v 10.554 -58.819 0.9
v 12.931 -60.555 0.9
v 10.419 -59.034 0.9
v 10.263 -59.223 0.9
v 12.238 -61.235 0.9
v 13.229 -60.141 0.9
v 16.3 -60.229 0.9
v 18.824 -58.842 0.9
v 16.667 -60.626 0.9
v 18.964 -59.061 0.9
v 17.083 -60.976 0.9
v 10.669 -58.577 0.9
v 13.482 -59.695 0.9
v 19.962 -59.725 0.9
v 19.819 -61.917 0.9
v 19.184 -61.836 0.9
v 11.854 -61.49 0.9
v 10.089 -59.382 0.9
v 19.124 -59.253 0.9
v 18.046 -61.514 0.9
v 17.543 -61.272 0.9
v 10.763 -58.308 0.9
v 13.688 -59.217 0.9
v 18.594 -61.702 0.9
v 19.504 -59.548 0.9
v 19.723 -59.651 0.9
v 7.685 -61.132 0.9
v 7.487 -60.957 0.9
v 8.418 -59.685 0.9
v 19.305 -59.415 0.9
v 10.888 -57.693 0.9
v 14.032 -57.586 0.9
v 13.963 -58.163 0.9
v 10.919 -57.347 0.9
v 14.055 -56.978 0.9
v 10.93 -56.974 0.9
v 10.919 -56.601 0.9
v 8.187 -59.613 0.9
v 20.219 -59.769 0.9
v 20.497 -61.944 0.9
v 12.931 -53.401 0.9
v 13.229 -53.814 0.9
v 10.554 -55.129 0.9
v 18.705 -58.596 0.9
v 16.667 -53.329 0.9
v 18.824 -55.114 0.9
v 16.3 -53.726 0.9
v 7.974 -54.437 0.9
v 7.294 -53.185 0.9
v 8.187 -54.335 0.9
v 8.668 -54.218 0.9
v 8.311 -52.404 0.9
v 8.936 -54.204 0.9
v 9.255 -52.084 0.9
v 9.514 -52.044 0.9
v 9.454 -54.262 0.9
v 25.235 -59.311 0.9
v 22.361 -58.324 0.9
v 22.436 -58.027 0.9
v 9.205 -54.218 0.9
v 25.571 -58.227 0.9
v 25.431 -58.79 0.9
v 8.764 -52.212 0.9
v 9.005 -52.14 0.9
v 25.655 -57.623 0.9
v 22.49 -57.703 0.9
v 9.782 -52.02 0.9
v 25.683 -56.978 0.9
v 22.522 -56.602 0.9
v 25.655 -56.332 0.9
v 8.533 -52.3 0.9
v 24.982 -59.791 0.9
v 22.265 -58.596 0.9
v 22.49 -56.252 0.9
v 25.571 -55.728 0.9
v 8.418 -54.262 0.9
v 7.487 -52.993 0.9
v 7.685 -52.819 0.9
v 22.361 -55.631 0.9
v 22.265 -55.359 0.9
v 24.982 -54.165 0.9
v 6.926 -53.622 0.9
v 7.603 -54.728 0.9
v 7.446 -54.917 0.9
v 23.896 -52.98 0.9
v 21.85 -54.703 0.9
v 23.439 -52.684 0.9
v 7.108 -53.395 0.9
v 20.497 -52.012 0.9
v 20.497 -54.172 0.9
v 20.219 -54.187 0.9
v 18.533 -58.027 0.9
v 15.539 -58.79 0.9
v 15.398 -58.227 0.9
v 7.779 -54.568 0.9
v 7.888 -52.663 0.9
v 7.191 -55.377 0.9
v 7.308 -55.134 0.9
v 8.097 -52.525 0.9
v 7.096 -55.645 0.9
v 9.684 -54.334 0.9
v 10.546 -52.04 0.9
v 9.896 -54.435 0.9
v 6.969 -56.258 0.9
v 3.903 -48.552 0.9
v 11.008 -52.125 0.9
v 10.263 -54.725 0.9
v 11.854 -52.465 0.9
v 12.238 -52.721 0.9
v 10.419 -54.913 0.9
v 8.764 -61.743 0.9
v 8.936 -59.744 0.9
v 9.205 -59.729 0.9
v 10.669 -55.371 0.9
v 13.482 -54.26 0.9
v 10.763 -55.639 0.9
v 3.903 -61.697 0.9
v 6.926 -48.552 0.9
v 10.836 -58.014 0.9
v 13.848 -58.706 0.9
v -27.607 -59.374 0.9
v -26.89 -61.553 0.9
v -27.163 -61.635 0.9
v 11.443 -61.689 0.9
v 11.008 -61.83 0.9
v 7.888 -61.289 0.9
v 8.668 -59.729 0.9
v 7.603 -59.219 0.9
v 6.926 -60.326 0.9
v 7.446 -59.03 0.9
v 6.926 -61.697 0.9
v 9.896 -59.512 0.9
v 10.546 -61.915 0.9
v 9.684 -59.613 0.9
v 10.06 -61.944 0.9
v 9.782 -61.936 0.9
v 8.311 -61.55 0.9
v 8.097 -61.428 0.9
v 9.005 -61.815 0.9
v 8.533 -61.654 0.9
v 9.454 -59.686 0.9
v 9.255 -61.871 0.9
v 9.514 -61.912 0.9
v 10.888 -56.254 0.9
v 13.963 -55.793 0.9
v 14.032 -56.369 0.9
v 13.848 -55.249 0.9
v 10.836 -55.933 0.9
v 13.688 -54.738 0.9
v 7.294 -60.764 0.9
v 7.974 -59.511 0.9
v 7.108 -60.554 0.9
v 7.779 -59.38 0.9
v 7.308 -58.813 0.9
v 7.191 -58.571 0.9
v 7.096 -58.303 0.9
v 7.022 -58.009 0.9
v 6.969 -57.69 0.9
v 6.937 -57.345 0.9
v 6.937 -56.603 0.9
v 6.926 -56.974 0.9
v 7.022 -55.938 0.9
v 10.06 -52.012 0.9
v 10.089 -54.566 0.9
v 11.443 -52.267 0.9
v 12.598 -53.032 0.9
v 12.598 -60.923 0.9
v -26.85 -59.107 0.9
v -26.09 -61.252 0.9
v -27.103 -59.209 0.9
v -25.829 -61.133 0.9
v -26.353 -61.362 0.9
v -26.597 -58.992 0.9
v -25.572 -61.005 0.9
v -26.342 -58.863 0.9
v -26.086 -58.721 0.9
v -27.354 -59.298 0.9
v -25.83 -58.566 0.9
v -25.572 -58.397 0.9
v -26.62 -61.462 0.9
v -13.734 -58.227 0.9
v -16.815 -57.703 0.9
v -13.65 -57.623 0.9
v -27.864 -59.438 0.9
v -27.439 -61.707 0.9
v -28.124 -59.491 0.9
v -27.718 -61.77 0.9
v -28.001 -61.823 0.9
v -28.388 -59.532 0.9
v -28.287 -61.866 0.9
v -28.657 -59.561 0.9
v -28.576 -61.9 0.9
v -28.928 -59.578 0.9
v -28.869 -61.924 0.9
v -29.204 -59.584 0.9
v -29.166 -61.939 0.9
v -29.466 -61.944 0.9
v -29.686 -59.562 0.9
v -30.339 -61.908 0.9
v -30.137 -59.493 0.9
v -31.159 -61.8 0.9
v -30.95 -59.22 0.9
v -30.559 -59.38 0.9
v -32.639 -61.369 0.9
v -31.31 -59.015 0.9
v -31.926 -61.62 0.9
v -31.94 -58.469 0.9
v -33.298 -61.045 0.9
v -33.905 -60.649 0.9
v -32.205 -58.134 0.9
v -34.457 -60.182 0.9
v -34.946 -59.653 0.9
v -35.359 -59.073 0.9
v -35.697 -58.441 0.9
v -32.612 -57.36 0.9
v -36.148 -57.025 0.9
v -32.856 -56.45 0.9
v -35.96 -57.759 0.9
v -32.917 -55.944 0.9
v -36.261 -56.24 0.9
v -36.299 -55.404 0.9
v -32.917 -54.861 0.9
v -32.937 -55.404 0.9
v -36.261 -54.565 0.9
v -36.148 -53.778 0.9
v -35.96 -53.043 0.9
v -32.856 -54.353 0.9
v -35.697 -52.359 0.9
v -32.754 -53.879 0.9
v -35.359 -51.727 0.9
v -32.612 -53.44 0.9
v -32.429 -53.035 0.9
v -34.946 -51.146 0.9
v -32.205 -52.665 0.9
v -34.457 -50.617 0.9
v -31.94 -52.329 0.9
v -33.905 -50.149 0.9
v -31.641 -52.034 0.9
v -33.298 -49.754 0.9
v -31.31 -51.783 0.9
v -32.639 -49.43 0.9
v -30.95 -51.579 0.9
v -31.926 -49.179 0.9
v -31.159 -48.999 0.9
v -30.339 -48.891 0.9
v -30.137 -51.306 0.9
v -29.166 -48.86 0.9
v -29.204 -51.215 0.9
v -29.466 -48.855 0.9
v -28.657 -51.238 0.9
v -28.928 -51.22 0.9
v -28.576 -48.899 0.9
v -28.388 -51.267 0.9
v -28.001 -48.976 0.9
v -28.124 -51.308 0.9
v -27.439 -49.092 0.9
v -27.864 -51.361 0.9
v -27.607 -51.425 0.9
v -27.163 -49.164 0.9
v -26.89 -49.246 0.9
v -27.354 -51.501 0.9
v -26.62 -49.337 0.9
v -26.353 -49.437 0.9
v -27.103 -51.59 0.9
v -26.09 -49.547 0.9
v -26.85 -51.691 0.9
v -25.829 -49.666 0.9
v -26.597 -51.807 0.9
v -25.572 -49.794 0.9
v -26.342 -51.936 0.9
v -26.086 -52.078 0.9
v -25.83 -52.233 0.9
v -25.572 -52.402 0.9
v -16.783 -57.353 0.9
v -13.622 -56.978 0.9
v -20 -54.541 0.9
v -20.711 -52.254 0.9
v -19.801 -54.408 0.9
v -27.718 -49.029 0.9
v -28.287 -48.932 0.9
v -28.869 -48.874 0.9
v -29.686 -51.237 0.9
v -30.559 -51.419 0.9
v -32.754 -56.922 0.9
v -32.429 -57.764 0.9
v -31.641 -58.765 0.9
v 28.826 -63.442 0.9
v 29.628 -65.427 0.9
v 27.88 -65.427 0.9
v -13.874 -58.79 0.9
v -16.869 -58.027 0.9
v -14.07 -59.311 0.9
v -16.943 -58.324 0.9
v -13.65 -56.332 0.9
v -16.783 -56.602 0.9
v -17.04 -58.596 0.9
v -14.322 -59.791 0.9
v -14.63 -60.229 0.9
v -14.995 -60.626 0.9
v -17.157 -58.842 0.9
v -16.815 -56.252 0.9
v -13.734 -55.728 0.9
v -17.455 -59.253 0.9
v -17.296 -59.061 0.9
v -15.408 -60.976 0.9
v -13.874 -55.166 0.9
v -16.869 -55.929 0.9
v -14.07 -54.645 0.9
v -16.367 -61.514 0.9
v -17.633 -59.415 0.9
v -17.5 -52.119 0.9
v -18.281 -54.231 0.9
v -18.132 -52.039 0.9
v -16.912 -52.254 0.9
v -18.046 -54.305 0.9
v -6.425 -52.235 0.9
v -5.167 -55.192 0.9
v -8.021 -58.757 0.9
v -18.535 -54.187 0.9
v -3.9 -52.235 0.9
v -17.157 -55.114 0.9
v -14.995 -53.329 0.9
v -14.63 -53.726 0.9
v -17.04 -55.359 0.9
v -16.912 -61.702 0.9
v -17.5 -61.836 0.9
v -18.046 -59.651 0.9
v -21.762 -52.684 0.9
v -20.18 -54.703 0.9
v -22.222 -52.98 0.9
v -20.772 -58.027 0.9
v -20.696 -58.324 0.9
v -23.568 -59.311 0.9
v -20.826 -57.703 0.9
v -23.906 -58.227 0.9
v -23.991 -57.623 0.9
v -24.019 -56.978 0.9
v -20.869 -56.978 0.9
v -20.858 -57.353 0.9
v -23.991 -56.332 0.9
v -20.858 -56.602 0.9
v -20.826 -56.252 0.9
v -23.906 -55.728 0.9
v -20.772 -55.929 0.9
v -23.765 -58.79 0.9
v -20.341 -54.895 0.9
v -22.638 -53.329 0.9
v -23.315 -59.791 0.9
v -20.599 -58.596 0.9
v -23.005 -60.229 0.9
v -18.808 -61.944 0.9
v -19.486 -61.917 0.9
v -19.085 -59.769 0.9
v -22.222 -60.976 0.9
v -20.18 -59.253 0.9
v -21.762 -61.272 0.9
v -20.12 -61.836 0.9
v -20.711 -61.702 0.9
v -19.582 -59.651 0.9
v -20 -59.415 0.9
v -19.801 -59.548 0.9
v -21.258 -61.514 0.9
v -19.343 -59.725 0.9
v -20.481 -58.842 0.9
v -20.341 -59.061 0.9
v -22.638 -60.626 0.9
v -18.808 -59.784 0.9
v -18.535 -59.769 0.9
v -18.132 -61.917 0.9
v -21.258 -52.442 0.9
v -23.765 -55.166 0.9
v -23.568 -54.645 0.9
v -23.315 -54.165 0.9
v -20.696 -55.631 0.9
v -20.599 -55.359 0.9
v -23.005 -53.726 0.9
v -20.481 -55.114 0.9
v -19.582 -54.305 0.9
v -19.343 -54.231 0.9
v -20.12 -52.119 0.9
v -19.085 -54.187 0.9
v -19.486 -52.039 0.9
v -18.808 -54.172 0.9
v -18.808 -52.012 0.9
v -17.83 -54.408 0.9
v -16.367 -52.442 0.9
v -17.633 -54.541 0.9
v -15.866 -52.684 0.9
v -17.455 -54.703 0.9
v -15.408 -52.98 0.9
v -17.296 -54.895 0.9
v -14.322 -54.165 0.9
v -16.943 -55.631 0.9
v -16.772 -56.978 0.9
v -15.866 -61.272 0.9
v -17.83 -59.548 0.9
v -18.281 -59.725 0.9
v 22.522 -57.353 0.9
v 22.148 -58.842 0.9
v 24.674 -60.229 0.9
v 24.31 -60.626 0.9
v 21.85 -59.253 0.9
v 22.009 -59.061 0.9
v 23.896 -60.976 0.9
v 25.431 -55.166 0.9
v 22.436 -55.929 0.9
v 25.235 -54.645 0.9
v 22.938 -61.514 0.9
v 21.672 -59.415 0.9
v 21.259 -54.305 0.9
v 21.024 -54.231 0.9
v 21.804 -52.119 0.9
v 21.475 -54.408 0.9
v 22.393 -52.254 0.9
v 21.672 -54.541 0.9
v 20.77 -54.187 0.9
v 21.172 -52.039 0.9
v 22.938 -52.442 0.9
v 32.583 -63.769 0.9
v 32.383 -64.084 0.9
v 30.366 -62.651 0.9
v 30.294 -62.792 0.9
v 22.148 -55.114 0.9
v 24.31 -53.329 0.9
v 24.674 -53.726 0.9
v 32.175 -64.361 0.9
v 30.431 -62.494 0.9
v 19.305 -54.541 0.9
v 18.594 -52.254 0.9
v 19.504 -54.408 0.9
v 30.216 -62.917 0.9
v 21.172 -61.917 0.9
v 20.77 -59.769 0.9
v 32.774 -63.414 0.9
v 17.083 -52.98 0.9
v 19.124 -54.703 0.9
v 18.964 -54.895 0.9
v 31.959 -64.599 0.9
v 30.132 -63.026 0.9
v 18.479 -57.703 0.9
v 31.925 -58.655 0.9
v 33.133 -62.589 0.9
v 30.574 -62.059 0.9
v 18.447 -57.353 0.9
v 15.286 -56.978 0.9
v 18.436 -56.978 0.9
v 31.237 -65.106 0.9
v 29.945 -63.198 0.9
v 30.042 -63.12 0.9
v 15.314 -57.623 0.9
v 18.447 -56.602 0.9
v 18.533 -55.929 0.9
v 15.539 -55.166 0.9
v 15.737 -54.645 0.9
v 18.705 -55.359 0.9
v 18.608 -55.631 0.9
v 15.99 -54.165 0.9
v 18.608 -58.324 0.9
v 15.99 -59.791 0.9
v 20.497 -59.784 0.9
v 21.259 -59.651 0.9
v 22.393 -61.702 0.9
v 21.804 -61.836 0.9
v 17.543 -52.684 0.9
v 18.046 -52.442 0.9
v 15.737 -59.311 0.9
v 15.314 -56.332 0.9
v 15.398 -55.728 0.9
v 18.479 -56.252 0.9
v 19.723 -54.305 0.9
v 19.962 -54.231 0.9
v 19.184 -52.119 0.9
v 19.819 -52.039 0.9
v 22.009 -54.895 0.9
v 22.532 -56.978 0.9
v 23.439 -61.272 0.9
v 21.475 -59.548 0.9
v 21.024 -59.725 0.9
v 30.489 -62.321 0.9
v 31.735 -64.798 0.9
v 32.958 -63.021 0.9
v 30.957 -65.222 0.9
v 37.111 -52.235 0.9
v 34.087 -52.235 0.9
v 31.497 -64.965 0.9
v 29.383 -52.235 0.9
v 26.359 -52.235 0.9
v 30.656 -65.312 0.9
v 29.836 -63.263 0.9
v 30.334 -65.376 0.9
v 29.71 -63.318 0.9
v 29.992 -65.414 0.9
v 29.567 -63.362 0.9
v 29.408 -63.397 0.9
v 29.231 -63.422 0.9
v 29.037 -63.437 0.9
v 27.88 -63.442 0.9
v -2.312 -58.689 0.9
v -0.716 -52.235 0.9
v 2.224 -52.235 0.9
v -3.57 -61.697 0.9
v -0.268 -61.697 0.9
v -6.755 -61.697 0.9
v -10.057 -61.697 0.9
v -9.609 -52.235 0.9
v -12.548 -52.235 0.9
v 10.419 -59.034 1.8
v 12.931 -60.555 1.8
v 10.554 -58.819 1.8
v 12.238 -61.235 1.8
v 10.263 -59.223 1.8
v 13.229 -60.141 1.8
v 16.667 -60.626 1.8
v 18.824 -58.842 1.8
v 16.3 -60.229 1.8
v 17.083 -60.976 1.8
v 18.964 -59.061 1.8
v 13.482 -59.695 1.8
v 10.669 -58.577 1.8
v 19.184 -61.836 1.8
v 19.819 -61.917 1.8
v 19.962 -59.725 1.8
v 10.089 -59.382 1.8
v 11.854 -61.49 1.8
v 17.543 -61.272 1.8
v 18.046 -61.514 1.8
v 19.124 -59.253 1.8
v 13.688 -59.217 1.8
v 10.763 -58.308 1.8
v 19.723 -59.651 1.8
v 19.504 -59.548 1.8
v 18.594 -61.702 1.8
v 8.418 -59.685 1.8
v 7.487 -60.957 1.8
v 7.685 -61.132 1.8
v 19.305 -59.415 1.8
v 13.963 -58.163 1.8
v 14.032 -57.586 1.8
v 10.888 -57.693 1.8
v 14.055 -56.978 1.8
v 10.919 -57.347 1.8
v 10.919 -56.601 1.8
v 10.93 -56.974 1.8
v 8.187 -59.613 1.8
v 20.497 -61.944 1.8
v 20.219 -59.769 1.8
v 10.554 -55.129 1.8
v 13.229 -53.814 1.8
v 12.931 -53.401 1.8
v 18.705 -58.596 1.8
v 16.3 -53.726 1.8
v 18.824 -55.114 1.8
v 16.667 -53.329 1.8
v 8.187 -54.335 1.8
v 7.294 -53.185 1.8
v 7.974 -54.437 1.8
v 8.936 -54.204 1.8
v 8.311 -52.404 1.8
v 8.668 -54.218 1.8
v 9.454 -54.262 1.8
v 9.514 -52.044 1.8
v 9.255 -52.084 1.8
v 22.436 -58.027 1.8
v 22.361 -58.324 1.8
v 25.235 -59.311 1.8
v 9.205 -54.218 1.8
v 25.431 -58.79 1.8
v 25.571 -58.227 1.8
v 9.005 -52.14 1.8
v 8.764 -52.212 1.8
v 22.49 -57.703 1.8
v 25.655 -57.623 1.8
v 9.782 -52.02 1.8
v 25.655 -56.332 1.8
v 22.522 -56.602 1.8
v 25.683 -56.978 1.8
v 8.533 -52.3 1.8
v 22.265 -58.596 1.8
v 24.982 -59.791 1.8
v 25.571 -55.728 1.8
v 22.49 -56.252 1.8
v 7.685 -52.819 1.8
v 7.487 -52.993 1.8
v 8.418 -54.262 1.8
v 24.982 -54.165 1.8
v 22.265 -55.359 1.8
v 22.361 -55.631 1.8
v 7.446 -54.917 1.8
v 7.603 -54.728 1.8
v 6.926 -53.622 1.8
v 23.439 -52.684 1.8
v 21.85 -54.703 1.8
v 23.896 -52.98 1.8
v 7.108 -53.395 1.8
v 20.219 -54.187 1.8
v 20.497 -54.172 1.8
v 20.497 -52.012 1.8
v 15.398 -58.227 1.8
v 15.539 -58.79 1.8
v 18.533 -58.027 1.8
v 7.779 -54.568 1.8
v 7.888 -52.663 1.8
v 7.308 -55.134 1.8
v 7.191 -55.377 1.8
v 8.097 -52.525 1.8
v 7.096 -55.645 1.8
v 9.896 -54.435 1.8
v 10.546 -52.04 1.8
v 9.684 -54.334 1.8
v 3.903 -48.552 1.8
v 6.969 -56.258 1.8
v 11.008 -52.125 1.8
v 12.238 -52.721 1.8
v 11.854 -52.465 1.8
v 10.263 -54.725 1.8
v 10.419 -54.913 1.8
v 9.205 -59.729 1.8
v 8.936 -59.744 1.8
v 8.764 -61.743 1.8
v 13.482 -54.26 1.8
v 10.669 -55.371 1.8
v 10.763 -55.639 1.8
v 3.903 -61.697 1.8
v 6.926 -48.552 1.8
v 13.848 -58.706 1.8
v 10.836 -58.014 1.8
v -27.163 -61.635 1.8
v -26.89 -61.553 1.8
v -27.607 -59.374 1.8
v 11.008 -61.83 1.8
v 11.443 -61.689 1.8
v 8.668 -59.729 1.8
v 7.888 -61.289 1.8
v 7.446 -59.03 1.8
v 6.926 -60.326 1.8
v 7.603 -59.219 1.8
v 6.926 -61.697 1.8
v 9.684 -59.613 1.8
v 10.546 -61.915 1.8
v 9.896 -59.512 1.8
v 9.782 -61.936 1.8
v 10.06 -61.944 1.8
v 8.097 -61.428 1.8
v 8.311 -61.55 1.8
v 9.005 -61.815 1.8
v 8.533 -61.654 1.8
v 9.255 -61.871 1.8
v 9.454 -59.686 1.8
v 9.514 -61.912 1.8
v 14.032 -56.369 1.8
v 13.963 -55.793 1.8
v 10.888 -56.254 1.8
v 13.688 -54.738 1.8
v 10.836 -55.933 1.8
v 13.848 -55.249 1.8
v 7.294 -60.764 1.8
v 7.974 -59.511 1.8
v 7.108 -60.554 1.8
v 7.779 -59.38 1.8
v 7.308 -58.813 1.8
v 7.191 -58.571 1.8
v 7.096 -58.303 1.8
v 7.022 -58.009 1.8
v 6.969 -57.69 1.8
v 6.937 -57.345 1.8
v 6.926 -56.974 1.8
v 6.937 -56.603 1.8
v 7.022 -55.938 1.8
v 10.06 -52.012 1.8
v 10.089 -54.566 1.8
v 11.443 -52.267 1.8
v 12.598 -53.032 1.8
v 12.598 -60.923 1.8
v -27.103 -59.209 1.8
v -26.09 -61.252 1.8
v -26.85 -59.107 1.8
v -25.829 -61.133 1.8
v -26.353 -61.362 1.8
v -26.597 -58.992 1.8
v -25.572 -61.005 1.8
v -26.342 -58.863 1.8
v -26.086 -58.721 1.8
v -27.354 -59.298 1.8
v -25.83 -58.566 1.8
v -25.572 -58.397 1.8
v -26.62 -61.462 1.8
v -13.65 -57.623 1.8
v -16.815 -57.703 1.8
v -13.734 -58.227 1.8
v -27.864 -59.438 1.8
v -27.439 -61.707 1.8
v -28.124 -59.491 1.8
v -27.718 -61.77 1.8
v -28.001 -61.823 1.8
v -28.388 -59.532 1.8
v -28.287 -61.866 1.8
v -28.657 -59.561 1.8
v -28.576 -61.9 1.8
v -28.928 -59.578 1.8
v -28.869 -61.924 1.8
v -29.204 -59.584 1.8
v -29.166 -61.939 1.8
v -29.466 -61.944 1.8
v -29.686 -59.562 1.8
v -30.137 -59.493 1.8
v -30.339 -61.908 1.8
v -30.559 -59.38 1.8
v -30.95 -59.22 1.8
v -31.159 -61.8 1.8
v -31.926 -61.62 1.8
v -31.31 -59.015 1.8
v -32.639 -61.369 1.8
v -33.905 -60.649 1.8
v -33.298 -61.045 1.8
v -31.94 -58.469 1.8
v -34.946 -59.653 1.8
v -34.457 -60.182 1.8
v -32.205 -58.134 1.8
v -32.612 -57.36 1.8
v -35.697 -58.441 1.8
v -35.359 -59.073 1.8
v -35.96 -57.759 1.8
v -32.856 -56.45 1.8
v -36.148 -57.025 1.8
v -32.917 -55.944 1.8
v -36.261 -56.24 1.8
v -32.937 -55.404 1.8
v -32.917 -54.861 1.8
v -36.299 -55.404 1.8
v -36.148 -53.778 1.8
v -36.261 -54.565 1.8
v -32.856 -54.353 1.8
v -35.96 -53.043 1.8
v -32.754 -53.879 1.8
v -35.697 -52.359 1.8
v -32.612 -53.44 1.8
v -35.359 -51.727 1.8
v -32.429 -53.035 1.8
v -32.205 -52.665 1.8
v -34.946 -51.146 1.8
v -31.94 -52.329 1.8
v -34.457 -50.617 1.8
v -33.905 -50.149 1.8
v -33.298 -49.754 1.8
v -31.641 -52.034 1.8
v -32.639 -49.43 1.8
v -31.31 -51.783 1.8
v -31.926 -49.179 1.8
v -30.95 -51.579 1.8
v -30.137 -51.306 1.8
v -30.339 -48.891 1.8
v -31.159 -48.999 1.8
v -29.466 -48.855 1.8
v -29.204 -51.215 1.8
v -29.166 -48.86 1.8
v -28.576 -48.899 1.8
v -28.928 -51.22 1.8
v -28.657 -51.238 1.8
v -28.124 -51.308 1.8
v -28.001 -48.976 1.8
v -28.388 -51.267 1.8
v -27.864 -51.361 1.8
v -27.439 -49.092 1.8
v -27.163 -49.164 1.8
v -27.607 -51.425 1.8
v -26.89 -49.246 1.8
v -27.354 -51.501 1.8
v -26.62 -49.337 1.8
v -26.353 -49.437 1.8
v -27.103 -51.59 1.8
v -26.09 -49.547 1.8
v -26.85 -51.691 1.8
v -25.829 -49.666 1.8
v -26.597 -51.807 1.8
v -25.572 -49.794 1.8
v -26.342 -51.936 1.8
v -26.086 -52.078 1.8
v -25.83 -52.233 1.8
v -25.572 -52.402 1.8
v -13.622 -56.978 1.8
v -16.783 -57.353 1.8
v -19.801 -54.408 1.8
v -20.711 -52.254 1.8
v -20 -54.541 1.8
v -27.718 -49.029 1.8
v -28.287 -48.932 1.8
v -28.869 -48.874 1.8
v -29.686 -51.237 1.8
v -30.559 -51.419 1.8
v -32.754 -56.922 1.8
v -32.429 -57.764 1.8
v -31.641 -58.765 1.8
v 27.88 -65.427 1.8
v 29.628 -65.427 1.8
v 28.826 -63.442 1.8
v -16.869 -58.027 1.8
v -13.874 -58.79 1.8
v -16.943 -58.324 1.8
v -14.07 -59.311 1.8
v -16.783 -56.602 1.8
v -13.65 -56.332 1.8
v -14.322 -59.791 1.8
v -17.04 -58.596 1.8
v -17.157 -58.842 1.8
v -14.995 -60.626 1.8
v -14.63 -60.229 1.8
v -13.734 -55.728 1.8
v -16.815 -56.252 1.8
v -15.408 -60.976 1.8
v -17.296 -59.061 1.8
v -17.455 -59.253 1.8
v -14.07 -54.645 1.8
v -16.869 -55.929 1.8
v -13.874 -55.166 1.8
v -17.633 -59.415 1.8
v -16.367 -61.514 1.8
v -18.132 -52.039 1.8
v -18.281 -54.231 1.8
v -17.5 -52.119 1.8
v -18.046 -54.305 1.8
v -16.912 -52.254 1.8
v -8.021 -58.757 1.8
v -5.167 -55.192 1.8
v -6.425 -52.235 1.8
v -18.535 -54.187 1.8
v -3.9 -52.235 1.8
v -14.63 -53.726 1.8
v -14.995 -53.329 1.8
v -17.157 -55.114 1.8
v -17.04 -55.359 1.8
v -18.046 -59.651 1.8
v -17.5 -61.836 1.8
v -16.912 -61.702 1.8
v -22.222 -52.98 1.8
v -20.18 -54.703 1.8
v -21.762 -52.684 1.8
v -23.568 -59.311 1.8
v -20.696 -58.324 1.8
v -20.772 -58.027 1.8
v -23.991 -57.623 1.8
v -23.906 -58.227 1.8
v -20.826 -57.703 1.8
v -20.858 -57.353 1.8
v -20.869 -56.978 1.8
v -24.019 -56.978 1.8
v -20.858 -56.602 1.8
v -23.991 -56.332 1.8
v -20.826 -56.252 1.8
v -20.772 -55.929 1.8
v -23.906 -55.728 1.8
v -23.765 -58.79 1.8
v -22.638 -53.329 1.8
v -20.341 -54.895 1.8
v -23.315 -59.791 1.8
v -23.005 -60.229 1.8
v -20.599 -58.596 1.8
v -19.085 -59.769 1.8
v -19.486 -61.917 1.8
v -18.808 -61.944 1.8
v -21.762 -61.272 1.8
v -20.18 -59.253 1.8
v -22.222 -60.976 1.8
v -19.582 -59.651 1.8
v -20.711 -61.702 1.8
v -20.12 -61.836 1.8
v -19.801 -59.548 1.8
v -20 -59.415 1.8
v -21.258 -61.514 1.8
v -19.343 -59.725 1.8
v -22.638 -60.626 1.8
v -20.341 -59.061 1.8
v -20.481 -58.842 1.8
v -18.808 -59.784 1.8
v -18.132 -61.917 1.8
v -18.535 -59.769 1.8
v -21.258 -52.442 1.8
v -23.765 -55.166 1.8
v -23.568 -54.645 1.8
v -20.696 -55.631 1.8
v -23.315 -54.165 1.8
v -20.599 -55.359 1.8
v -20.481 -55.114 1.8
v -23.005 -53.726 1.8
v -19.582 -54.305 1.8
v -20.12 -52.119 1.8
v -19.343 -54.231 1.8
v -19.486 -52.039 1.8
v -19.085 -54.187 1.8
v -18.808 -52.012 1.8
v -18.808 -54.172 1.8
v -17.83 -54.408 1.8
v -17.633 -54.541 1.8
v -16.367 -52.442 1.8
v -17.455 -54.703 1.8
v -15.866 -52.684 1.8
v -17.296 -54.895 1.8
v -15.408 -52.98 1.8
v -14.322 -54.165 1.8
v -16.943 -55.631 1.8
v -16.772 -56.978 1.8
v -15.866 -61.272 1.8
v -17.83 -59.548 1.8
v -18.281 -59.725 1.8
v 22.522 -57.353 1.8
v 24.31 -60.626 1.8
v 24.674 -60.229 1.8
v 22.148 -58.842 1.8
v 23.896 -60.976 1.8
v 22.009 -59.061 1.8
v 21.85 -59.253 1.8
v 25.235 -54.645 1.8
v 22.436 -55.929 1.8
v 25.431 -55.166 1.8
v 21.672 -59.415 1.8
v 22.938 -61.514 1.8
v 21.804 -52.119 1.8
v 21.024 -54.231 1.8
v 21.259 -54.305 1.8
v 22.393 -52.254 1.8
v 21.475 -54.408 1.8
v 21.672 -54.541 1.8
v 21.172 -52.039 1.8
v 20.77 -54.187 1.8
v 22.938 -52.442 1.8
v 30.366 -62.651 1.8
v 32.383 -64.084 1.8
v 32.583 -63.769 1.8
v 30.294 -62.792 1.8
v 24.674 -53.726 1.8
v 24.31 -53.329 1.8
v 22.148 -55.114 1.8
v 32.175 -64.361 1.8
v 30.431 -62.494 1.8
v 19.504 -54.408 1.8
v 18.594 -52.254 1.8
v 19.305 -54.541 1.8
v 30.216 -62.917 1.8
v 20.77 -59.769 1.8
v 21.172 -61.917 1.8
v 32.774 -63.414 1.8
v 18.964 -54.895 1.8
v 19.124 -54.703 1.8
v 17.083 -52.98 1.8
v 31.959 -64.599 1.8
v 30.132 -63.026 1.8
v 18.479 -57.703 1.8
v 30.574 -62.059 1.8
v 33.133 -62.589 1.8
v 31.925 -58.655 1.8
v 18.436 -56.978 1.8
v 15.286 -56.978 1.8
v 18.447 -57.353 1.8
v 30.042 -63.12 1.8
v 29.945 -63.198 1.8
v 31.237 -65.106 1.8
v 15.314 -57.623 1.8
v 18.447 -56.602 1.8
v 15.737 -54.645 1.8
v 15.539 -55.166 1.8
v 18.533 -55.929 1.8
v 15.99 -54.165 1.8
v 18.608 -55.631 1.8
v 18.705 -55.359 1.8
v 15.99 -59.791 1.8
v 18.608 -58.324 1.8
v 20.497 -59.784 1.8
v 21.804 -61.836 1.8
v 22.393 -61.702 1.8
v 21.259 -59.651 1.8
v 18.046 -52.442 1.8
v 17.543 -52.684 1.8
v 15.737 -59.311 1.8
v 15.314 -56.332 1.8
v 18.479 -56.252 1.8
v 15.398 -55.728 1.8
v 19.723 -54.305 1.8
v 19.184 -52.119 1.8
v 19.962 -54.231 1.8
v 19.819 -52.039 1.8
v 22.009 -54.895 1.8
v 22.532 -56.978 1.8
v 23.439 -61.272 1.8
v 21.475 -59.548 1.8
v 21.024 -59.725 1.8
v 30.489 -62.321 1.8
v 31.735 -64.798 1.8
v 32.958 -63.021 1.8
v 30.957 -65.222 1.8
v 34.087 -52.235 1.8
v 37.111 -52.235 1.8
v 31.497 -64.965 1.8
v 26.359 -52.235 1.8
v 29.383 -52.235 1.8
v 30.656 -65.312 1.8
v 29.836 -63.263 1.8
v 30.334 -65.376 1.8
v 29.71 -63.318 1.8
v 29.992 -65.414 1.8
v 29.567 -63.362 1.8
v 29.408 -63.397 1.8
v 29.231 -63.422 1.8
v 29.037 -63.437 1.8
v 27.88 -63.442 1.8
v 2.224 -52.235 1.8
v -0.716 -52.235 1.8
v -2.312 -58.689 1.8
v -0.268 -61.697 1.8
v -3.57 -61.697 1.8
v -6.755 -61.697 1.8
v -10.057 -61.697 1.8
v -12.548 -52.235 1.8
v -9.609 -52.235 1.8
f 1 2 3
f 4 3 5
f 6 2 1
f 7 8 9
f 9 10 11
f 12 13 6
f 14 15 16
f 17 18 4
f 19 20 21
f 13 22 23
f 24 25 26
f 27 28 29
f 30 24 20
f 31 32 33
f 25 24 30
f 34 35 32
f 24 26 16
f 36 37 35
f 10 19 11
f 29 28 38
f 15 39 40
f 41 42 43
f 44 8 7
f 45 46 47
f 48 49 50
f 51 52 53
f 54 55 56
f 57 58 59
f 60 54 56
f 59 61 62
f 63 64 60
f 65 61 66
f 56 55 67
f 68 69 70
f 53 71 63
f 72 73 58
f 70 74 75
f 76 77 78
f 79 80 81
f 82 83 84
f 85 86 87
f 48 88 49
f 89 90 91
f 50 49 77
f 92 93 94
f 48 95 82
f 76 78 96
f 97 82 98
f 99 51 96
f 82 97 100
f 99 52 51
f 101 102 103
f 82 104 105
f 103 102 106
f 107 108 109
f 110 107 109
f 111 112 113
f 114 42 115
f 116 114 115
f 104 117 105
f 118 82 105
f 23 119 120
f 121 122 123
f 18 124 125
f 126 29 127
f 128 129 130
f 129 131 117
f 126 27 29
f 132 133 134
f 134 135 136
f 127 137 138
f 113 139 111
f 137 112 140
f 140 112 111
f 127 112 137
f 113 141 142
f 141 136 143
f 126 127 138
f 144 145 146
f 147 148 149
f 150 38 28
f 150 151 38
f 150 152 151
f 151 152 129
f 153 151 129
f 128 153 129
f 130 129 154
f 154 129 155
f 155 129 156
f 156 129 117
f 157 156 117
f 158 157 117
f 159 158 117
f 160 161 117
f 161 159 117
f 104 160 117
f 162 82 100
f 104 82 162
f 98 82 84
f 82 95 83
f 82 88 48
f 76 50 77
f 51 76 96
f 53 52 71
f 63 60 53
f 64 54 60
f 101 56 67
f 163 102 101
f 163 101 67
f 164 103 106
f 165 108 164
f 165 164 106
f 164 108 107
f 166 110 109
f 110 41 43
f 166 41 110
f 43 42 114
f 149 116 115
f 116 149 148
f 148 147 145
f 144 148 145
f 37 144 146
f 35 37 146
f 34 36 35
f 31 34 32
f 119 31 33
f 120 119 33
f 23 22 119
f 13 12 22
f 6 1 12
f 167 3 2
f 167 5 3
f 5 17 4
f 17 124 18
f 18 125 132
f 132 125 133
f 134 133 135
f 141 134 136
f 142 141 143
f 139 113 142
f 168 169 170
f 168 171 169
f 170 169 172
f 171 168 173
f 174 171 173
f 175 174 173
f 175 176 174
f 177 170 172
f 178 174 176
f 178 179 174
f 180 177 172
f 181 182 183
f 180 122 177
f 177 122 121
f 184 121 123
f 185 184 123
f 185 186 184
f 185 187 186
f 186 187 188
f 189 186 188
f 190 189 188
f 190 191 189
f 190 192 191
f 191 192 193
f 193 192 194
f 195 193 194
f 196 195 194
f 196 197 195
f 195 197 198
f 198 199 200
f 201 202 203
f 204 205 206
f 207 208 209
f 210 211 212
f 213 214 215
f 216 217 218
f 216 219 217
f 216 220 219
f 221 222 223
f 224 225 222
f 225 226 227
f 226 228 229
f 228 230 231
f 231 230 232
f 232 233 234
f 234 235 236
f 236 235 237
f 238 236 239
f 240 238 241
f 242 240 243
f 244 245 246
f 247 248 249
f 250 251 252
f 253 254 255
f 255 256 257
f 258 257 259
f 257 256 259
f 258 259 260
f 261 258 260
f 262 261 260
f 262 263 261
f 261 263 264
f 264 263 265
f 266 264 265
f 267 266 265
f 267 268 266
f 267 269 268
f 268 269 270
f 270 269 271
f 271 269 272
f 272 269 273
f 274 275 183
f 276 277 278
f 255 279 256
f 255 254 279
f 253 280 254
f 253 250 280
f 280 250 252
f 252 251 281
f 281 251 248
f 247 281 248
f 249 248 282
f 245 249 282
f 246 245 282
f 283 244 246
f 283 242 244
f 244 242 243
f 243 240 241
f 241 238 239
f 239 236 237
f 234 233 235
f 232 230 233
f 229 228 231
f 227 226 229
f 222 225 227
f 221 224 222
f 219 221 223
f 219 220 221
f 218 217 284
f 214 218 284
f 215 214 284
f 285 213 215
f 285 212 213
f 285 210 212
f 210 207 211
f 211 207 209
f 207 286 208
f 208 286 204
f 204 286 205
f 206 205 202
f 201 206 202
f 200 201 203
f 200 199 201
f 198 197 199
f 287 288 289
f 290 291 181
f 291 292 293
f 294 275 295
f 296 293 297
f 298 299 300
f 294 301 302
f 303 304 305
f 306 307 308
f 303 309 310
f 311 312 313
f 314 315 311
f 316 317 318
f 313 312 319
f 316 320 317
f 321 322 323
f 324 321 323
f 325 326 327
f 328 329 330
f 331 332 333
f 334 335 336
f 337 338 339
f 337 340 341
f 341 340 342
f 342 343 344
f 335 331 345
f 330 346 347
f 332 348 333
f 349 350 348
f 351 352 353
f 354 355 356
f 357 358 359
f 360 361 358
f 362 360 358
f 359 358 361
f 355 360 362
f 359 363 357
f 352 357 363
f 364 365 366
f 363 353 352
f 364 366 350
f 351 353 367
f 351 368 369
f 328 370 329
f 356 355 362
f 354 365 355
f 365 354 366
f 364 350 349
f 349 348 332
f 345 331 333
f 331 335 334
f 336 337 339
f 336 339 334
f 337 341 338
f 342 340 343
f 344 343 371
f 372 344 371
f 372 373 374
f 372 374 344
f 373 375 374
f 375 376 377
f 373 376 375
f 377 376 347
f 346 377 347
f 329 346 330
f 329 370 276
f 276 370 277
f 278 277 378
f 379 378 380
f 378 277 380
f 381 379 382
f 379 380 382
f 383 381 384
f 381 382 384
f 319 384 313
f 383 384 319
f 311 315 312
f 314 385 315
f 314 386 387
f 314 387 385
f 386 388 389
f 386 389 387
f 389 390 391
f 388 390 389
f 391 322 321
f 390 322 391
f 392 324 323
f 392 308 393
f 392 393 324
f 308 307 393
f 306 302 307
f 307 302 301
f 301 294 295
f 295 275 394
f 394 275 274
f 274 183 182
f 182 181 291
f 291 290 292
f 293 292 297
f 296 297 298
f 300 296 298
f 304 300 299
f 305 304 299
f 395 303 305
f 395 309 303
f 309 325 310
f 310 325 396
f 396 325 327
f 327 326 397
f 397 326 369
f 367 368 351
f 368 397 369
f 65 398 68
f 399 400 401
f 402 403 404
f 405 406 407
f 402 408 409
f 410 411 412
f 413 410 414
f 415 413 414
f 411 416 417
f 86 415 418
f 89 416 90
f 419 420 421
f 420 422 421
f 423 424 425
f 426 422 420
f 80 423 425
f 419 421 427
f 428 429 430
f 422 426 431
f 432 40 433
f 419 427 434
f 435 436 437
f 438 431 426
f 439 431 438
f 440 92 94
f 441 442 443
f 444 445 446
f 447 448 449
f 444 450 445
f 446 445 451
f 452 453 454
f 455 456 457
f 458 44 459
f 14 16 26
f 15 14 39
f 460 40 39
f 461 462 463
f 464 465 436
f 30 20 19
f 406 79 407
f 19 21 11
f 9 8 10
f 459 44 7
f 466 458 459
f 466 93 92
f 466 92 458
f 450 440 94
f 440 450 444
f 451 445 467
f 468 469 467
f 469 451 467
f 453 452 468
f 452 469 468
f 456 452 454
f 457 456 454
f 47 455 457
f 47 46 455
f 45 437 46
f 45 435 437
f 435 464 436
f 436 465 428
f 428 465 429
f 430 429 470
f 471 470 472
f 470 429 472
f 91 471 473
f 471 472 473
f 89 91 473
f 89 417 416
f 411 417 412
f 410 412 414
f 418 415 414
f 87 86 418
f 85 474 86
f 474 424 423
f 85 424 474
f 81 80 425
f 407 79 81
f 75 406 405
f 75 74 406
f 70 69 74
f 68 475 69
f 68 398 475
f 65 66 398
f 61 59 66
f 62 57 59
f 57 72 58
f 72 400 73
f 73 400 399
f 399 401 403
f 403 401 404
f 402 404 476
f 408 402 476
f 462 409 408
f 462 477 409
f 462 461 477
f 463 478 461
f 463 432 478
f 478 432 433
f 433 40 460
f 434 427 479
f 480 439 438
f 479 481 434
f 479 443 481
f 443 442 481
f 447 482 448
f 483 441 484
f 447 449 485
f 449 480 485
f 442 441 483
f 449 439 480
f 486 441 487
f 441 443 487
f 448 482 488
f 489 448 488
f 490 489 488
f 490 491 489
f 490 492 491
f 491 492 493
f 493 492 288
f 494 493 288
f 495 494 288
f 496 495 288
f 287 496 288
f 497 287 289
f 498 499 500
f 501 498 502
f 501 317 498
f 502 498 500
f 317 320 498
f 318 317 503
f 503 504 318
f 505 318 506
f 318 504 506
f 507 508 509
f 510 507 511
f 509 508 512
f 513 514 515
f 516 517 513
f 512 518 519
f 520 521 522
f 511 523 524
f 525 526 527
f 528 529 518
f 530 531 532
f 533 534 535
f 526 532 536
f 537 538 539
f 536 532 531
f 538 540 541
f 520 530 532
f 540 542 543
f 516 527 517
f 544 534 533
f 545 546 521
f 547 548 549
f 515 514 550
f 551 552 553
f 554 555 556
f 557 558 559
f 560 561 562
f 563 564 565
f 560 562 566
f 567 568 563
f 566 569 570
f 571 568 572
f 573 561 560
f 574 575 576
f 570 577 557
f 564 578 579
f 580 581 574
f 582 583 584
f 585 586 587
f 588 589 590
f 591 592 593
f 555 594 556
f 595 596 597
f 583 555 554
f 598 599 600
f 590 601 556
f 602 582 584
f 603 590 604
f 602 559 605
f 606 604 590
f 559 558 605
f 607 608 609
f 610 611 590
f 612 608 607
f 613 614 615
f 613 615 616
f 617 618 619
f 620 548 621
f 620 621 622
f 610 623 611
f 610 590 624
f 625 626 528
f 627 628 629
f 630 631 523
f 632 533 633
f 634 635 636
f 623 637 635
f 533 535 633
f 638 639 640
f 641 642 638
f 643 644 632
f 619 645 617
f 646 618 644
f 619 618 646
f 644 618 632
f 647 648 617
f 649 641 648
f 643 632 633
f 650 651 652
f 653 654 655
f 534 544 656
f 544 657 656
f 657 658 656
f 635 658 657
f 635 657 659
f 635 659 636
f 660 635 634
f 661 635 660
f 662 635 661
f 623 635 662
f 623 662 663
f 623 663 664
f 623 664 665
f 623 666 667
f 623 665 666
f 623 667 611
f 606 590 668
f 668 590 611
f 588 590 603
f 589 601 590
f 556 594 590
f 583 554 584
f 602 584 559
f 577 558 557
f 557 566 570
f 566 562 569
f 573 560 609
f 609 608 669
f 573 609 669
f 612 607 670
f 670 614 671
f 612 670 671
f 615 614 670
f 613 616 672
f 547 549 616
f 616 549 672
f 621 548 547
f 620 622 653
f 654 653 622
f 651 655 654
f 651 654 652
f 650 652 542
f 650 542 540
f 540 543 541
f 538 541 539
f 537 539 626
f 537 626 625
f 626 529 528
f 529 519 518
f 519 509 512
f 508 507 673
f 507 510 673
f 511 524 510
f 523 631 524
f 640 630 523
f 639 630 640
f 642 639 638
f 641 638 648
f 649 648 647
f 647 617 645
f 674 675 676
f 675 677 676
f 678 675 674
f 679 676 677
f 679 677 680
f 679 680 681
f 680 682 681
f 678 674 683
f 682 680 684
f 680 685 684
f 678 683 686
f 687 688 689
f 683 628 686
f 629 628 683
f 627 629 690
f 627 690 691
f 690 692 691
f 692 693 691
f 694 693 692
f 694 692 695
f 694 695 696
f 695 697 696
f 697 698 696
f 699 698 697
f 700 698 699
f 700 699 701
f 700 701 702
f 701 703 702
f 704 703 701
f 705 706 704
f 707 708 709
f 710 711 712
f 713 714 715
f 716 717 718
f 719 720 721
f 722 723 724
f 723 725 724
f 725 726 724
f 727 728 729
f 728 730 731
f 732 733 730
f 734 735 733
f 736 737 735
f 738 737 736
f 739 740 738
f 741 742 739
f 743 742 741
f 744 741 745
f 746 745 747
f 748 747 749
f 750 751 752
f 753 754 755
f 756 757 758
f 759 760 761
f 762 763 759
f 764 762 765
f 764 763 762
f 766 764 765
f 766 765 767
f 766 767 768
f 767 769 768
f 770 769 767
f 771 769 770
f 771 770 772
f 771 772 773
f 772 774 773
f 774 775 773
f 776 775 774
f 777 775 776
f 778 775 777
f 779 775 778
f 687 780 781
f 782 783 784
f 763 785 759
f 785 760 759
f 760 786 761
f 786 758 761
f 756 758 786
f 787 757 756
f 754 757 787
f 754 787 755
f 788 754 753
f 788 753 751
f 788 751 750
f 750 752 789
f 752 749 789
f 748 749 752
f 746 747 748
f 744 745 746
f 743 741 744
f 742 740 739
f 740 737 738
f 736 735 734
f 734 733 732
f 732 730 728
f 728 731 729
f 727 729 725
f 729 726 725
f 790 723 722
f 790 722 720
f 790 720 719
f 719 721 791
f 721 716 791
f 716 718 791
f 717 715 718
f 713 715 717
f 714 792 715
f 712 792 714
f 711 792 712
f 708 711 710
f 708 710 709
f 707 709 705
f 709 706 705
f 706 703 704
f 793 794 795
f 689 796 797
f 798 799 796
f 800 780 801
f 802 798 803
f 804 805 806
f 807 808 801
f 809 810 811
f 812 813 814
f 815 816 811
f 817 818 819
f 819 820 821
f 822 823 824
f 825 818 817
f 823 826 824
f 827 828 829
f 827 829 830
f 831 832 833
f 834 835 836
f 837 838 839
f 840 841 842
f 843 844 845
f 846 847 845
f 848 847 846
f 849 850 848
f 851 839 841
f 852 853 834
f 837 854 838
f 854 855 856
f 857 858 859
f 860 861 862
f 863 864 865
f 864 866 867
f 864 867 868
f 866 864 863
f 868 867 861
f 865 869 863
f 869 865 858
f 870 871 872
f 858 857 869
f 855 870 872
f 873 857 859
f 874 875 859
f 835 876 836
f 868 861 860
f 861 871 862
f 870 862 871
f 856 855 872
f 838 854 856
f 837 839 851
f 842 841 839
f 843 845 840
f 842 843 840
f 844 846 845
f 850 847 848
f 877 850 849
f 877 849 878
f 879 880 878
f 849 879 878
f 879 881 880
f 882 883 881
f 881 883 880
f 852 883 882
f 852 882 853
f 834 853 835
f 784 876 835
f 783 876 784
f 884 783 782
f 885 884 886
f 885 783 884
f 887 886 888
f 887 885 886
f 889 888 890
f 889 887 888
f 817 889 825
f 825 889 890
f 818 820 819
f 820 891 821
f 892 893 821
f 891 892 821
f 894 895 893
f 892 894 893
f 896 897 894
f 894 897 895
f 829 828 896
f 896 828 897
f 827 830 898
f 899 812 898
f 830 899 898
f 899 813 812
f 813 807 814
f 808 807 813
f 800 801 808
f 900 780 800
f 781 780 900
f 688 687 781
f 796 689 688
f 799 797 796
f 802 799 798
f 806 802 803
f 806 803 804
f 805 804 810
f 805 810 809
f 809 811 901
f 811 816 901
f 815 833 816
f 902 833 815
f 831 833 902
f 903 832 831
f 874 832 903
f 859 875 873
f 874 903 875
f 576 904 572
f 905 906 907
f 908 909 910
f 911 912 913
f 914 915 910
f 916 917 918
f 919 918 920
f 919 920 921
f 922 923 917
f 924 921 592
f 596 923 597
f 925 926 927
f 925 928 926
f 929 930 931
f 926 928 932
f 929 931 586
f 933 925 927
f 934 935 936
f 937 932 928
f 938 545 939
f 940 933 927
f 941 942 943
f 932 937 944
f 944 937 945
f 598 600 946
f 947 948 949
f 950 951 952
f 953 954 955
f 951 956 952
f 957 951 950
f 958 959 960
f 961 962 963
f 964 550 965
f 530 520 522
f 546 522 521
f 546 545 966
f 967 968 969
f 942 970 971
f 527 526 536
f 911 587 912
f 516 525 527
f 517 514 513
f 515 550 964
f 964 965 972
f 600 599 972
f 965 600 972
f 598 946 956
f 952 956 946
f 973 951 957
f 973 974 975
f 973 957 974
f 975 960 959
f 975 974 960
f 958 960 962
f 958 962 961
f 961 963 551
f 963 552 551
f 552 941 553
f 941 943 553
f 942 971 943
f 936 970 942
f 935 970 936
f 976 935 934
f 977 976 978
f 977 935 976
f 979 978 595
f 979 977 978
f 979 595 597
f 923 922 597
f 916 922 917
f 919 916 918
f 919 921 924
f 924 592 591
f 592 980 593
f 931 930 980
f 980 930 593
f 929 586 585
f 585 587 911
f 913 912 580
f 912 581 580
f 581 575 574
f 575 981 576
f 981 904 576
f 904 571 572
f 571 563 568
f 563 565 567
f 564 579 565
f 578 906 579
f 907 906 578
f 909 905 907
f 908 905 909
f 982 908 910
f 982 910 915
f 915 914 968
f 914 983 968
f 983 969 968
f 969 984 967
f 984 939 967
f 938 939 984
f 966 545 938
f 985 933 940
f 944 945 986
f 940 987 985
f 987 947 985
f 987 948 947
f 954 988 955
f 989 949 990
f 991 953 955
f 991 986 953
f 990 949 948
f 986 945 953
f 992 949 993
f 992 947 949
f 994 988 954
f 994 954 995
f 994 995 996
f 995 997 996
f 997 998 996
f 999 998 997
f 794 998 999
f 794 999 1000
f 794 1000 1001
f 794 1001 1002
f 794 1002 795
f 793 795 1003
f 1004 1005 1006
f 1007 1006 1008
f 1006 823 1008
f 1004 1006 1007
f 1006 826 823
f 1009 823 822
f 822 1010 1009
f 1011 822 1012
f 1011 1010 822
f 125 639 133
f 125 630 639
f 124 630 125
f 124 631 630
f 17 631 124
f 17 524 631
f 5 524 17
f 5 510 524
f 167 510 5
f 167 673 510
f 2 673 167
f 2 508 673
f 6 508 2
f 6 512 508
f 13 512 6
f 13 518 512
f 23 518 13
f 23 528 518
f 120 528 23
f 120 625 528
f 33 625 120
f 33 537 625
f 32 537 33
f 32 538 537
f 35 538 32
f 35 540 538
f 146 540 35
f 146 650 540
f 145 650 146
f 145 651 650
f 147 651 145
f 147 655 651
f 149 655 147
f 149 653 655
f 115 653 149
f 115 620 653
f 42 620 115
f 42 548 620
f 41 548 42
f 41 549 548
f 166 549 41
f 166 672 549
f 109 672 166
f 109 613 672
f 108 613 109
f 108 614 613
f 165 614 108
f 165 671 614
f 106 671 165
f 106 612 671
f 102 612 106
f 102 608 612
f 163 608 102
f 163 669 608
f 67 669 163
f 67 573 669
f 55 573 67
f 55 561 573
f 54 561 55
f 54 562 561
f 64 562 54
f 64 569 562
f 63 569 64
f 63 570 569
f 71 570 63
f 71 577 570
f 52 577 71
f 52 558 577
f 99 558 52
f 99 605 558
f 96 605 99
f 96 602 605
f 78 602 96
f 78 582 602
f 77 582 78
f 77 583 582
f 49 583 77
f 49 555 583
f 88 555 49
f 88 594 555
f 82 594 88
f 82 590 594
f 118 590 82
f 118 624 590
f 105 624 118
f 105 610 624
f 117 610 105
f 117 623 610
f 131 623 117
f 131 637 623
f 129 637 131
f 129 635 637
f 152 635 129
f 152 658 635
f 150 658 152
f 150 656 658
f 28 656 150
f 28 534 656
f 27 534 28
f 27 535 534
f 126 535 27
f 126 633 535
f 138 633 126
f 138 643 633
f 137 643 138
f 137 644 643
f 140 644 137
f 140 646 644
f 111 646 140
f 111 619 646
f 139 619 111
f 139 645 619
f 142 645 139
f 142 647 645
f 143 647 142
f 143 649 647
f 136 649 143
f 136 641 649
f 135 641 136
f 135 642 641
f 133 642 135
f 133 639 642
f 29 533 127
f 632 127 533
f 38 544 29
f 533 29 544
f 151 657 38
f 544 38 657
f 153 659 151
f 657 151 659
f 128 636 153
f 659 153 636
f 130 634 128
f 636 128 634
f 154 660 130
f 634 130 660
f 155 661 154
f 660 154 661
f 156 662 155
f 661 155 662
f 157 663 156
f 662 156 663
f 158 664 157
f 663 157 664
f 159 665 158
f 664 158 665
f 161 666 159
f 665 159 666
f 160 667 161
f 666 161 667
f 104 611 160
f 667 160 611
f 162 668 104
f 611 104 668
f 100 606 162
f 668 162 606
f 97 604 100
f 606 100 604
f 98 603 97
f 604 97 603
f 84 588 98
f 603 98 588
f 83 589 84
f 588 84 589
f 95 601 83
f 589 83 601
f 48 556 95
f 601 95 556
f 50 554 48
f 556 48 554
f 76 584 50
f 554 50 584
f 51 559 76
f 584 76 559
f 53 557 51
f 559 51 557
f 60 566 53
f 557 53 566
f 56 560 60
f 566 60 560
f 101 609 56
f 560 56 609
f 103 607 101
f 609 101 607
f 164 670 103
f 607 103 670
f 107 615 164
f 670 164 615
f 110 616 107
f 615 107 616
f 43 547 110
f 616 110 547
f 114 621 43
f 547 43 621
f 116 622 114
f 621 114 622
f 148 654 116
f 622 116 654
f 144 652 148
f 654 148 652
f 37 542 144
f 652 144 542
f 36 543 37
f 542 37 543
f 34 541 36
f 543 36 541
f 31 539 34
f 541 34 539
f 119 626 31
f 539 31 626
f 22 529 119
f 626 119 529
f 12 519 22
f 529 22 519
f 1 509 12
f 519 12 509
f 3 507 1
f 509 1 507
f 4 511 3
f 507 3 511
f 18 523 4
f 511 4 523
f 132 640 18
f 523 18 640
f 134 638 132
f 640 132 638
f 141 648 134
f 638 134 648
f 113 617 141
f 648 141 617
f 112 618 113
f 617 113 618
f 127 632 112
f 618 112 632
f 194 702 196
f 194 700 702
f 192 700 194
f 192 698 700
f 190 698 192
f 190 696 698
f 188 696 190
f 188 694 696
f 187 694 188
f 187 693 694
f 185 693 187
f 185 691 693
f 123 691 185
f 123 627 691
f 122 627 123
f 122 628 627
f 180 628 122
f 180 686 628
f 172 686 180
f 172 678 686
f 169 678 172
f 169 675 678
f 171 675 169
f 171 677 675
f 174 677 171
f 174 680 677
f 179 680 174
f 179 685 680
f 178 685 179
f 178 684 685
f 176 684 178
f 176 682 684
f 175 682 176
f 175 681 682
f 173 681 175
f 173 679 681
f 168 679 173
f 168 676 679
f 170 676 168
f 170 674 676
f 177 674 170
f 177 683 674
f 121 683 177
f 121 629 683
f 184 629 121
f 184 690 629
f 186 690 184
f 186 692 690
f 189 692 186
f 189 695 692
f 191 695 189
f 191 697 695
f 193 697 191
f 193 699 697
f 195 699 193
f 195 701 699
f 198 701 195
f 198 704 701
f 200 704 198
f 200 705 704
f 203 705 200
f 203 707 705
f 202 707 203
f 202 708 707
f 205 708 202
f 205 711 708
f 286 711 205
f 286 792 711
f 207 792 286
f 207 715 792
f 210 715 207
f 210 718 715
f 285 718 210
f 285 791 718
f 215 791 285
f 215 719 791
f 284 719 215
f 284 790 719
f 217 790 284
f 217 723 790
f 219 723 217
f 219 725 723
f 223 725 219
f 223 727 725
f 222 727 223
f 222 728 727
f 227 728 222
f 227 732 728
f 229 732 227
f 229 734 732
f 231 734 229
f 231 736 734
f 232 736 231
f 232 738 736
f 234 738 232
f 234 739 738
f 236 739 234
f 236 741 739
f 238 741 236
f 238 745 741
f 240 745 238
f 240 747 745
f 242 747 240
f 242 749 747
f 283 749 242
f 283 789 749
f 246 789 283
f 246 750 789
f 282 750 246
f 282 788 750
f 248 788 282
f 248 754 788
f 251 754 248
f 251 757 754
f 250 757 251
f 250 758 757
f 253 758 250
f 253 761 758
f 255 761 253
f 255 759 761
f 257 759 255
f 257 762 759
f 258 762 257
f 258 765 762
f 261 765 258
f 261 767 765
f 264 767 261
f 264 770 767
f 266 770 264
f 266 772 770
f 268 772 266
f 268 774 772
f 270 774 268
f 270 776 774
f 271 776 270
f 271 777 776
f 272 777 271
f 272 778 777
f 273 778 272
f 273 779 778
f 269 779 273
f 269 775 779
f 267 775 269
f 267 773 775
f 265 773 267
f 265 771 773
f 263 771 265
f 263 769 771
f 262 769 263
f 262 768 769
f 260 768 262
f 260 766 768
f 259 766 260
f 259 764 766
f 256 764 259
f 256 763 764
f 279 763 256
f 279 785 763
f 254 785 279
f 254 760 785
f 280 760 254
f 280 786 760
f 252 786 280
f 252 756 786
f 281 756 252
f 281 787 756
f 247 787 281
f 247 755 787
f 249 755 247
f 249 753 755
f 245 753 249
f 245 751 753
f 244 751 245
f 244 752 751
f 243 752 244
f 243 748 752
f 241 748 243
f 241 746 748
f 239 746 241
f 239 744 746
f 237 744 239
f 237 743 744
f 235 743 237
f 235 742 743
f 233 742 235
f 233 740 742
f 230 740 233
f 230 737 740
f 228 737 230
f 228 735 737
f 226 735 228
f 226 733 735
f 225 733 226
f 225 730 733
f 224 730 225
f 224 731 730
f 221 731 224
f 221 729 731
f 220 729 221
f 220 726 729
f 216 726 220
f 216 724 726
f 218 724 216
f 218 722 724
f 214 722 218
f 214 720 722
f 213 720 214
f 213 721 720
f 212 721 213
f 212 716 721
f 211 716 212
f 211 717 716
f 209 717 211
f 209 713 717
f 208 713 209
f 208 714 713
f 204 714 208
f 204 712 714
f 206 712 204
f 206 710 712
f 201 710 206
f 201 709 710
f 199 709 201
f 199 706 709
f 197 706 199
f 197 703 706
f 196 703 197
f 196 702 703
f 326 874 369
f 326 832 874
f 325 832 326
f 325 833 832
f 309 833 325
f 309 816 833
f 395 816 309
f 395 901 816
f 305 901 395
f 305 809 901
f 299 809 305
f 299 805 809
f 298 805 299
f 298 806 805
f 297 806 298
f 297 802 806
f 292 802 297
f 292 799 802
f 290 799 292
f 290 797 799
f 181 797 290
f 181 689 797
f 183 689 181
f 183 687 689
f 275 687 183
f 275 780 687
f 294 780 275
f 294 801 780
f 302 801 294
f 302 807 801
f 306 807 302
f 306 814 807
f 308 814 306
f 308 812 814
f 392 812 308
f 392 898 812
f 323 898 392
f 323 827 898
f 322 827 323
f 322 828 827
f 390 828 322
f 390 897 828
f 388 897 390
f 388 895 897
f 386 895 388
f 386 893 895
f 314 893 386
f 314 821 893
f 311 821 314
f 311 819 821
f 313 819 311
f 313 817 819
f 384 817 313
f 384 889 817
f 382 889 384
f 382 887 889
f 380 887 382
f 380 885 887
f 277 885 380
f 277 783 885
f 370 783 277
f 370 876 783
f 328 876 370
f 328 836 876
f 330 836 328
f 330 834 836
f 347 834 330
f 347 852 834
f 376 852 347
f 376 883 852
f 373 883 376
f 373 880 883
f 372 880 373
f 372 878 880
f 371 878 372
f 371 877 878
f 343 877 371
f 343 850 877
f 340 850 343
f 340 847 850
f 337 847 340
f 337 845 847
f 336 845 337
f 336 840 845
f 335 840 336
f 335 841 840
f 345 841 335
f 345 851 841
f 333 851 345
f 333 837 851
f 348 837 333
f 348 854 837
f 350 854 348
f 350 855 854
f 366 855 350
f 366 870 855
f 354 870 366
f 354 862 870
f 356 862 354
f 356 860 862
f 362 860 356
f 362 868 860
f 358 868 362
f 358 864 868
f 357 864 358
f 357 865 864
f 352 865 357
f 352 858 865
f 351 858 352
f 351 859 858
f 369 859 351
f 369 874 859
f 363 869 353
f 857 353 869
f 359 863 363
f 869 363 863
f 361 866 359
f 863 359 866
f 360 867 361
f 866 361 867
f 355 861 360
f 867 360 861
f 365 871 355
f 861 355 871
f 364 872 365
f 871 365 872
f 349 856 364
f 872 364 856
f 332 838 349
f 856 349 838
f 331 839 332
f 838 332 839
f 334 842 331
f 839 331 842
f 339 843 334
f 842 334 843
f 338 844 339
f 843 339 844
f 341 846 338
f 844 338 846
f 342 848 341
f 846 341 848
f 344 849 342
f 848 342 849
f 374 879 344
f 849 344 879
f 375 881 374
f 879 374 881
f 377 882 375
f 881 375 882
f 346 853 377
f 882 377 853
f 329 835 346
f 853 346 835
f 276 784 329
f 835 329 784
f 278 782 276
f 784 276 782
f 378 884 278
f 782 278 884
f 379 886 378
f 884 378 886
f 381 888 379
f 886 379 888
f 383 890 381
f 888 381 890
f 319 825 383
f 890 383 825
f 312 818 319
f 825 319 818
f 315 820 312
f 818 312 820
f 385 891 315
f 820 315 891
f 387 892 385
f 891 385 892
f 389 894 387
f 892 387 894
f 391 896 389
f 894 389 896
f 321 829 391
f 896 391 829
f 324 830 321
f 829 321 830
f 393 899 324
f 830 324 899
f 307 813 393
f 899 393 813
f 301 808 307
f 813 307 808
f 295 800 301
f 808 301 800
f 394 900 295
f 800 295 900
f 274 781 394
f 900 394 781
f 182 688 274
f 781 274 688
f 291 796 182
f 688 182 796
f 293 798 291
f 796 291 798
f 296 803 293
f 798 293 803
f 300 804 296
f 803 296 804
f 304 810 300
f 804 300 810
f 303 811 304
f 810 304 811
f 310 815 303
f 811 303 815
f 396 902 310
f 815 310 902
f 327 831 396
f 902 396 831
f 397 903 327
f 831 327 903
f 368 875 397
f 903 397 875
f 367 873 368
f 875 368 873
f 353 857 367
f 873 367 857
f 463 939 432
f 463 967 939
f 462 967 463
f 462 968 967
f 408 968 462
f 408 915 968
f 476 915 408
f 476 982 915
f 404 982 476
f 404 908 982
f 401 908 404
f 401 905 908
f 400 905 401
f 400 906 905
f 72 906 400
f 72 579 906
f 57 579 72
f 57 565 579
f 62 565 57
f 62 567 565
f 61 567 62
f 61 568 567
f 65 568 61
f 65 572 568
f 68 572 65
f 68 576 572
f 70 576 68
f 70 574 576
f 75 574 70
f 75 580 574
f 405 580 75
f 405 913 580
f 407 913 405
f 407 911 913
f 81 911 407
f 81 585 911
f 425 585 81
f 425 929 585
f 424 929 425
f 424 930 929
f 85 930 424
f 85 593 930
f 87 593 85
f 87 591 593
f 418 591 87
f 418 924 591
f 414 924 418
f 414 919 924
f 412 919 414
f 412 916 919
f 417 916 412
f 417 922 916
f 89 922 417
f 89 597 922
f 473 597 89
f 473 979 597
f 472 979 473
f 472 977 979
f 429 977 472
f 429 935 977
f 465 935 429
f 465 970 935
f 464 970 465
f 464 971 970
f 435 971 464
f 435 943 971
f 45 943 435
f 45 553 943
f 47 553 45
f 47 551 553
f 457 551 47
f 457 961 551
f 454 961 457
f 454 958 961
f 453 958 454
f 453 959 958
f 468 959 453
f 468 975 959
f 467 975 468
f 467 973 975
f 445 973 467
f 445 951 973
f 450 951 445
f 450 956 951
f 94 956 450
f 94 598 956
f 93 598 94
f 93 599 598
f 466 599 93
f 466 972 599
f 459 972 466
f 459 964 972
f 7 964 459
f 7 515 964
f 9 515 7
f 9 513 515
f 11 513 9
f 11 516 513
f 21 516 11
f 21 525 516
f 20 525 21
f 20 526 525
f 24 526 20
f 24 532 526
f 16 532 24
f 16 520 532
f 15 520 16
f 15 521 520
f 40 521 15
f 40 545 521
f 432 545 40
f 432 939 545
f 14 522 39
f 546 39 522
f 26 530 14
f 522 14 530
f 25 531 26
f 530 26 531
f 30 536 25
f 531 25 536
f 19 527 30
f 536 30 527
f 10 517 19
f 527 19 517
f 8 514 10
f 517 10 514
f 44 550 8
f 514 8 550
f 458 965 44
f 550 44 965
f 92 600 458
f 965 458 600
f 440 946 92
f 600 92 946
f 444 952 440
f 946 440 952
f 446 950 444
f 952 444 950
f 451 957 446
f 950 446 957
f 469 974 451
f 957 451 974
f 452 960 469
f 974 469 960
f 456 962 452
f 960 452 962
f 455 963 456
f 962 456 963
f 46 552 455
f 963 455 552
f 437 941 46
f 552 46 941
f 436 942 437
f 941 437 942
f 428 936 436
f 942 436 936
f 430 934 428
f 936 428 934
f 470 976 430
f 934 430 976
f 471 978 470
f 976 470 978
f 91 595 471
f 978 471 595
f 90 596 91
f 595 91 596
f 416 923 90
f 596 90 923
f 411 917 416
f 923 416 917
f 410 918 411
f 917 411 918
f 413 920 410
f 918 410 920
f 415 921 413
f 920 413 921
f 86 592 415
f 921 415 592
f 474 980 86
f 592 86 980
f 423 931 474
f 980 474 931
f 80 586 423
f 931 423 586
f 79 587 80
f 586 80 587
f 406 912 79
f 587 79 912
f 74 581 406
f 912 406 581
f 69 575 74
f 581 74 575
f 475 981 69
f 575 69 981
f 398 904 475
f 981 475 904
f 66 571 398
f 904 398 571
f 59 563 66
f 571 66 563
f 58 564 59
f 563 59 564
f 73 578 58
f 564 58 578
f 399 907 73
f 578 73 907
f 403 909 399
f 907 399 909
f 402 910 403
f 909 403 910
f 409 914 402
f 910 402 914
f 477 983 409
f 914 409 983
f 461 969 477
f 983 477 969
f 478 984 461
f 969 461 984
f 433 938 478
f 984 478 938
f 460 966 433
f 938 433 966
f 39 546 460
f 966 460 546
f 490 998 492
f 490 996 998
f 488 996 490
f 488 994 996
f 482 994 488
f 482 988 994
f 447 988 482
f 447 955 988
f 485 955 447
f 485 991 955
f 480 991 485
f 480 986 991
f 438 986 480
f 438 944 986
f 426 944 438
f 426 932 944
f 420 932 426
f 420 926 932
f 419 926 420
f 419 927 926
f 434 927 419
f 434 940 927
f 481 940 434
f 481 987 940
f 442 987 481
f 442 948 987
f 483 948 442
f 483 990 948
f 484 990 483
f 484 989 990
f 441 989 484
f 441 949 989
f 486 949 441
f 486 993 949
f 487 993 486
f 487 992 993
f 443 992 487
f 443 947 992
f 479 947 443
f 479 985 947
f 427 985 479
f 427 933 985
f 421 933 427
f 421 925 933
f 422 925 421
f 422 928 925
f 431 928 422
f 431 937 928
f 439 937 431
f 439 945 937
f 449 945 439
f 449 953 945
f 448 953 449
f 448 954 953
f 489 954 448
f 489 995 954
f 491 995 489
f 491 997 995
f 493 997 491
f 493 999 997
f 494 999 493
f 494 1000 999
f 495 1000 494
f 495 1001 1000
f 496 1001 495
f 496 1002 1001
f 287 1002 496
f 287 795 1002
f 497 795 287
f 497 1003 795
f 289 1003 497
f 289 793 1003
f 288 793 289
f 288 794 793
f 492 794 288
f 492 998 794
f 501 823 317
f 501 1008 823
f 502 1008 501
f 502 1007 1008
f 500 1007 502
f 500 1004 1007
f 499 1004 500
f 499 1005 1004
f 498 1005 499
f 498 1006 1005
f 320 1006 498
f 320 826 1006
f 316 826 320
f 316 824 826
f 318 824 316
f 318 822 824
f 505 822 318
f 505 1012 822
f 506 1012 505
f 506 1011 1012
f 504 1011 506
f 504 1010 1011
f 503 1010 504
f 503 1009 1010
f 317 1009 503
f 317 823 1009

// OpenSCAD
$fn = 48;
  // English (below bottom hole)
  translate([0, -57.100, 0.900]) linear_extrude(height=0.900) text("Cowboy", size=12.455, halign="center", valign="center", font="Helvetica Neue:style=Bold");
